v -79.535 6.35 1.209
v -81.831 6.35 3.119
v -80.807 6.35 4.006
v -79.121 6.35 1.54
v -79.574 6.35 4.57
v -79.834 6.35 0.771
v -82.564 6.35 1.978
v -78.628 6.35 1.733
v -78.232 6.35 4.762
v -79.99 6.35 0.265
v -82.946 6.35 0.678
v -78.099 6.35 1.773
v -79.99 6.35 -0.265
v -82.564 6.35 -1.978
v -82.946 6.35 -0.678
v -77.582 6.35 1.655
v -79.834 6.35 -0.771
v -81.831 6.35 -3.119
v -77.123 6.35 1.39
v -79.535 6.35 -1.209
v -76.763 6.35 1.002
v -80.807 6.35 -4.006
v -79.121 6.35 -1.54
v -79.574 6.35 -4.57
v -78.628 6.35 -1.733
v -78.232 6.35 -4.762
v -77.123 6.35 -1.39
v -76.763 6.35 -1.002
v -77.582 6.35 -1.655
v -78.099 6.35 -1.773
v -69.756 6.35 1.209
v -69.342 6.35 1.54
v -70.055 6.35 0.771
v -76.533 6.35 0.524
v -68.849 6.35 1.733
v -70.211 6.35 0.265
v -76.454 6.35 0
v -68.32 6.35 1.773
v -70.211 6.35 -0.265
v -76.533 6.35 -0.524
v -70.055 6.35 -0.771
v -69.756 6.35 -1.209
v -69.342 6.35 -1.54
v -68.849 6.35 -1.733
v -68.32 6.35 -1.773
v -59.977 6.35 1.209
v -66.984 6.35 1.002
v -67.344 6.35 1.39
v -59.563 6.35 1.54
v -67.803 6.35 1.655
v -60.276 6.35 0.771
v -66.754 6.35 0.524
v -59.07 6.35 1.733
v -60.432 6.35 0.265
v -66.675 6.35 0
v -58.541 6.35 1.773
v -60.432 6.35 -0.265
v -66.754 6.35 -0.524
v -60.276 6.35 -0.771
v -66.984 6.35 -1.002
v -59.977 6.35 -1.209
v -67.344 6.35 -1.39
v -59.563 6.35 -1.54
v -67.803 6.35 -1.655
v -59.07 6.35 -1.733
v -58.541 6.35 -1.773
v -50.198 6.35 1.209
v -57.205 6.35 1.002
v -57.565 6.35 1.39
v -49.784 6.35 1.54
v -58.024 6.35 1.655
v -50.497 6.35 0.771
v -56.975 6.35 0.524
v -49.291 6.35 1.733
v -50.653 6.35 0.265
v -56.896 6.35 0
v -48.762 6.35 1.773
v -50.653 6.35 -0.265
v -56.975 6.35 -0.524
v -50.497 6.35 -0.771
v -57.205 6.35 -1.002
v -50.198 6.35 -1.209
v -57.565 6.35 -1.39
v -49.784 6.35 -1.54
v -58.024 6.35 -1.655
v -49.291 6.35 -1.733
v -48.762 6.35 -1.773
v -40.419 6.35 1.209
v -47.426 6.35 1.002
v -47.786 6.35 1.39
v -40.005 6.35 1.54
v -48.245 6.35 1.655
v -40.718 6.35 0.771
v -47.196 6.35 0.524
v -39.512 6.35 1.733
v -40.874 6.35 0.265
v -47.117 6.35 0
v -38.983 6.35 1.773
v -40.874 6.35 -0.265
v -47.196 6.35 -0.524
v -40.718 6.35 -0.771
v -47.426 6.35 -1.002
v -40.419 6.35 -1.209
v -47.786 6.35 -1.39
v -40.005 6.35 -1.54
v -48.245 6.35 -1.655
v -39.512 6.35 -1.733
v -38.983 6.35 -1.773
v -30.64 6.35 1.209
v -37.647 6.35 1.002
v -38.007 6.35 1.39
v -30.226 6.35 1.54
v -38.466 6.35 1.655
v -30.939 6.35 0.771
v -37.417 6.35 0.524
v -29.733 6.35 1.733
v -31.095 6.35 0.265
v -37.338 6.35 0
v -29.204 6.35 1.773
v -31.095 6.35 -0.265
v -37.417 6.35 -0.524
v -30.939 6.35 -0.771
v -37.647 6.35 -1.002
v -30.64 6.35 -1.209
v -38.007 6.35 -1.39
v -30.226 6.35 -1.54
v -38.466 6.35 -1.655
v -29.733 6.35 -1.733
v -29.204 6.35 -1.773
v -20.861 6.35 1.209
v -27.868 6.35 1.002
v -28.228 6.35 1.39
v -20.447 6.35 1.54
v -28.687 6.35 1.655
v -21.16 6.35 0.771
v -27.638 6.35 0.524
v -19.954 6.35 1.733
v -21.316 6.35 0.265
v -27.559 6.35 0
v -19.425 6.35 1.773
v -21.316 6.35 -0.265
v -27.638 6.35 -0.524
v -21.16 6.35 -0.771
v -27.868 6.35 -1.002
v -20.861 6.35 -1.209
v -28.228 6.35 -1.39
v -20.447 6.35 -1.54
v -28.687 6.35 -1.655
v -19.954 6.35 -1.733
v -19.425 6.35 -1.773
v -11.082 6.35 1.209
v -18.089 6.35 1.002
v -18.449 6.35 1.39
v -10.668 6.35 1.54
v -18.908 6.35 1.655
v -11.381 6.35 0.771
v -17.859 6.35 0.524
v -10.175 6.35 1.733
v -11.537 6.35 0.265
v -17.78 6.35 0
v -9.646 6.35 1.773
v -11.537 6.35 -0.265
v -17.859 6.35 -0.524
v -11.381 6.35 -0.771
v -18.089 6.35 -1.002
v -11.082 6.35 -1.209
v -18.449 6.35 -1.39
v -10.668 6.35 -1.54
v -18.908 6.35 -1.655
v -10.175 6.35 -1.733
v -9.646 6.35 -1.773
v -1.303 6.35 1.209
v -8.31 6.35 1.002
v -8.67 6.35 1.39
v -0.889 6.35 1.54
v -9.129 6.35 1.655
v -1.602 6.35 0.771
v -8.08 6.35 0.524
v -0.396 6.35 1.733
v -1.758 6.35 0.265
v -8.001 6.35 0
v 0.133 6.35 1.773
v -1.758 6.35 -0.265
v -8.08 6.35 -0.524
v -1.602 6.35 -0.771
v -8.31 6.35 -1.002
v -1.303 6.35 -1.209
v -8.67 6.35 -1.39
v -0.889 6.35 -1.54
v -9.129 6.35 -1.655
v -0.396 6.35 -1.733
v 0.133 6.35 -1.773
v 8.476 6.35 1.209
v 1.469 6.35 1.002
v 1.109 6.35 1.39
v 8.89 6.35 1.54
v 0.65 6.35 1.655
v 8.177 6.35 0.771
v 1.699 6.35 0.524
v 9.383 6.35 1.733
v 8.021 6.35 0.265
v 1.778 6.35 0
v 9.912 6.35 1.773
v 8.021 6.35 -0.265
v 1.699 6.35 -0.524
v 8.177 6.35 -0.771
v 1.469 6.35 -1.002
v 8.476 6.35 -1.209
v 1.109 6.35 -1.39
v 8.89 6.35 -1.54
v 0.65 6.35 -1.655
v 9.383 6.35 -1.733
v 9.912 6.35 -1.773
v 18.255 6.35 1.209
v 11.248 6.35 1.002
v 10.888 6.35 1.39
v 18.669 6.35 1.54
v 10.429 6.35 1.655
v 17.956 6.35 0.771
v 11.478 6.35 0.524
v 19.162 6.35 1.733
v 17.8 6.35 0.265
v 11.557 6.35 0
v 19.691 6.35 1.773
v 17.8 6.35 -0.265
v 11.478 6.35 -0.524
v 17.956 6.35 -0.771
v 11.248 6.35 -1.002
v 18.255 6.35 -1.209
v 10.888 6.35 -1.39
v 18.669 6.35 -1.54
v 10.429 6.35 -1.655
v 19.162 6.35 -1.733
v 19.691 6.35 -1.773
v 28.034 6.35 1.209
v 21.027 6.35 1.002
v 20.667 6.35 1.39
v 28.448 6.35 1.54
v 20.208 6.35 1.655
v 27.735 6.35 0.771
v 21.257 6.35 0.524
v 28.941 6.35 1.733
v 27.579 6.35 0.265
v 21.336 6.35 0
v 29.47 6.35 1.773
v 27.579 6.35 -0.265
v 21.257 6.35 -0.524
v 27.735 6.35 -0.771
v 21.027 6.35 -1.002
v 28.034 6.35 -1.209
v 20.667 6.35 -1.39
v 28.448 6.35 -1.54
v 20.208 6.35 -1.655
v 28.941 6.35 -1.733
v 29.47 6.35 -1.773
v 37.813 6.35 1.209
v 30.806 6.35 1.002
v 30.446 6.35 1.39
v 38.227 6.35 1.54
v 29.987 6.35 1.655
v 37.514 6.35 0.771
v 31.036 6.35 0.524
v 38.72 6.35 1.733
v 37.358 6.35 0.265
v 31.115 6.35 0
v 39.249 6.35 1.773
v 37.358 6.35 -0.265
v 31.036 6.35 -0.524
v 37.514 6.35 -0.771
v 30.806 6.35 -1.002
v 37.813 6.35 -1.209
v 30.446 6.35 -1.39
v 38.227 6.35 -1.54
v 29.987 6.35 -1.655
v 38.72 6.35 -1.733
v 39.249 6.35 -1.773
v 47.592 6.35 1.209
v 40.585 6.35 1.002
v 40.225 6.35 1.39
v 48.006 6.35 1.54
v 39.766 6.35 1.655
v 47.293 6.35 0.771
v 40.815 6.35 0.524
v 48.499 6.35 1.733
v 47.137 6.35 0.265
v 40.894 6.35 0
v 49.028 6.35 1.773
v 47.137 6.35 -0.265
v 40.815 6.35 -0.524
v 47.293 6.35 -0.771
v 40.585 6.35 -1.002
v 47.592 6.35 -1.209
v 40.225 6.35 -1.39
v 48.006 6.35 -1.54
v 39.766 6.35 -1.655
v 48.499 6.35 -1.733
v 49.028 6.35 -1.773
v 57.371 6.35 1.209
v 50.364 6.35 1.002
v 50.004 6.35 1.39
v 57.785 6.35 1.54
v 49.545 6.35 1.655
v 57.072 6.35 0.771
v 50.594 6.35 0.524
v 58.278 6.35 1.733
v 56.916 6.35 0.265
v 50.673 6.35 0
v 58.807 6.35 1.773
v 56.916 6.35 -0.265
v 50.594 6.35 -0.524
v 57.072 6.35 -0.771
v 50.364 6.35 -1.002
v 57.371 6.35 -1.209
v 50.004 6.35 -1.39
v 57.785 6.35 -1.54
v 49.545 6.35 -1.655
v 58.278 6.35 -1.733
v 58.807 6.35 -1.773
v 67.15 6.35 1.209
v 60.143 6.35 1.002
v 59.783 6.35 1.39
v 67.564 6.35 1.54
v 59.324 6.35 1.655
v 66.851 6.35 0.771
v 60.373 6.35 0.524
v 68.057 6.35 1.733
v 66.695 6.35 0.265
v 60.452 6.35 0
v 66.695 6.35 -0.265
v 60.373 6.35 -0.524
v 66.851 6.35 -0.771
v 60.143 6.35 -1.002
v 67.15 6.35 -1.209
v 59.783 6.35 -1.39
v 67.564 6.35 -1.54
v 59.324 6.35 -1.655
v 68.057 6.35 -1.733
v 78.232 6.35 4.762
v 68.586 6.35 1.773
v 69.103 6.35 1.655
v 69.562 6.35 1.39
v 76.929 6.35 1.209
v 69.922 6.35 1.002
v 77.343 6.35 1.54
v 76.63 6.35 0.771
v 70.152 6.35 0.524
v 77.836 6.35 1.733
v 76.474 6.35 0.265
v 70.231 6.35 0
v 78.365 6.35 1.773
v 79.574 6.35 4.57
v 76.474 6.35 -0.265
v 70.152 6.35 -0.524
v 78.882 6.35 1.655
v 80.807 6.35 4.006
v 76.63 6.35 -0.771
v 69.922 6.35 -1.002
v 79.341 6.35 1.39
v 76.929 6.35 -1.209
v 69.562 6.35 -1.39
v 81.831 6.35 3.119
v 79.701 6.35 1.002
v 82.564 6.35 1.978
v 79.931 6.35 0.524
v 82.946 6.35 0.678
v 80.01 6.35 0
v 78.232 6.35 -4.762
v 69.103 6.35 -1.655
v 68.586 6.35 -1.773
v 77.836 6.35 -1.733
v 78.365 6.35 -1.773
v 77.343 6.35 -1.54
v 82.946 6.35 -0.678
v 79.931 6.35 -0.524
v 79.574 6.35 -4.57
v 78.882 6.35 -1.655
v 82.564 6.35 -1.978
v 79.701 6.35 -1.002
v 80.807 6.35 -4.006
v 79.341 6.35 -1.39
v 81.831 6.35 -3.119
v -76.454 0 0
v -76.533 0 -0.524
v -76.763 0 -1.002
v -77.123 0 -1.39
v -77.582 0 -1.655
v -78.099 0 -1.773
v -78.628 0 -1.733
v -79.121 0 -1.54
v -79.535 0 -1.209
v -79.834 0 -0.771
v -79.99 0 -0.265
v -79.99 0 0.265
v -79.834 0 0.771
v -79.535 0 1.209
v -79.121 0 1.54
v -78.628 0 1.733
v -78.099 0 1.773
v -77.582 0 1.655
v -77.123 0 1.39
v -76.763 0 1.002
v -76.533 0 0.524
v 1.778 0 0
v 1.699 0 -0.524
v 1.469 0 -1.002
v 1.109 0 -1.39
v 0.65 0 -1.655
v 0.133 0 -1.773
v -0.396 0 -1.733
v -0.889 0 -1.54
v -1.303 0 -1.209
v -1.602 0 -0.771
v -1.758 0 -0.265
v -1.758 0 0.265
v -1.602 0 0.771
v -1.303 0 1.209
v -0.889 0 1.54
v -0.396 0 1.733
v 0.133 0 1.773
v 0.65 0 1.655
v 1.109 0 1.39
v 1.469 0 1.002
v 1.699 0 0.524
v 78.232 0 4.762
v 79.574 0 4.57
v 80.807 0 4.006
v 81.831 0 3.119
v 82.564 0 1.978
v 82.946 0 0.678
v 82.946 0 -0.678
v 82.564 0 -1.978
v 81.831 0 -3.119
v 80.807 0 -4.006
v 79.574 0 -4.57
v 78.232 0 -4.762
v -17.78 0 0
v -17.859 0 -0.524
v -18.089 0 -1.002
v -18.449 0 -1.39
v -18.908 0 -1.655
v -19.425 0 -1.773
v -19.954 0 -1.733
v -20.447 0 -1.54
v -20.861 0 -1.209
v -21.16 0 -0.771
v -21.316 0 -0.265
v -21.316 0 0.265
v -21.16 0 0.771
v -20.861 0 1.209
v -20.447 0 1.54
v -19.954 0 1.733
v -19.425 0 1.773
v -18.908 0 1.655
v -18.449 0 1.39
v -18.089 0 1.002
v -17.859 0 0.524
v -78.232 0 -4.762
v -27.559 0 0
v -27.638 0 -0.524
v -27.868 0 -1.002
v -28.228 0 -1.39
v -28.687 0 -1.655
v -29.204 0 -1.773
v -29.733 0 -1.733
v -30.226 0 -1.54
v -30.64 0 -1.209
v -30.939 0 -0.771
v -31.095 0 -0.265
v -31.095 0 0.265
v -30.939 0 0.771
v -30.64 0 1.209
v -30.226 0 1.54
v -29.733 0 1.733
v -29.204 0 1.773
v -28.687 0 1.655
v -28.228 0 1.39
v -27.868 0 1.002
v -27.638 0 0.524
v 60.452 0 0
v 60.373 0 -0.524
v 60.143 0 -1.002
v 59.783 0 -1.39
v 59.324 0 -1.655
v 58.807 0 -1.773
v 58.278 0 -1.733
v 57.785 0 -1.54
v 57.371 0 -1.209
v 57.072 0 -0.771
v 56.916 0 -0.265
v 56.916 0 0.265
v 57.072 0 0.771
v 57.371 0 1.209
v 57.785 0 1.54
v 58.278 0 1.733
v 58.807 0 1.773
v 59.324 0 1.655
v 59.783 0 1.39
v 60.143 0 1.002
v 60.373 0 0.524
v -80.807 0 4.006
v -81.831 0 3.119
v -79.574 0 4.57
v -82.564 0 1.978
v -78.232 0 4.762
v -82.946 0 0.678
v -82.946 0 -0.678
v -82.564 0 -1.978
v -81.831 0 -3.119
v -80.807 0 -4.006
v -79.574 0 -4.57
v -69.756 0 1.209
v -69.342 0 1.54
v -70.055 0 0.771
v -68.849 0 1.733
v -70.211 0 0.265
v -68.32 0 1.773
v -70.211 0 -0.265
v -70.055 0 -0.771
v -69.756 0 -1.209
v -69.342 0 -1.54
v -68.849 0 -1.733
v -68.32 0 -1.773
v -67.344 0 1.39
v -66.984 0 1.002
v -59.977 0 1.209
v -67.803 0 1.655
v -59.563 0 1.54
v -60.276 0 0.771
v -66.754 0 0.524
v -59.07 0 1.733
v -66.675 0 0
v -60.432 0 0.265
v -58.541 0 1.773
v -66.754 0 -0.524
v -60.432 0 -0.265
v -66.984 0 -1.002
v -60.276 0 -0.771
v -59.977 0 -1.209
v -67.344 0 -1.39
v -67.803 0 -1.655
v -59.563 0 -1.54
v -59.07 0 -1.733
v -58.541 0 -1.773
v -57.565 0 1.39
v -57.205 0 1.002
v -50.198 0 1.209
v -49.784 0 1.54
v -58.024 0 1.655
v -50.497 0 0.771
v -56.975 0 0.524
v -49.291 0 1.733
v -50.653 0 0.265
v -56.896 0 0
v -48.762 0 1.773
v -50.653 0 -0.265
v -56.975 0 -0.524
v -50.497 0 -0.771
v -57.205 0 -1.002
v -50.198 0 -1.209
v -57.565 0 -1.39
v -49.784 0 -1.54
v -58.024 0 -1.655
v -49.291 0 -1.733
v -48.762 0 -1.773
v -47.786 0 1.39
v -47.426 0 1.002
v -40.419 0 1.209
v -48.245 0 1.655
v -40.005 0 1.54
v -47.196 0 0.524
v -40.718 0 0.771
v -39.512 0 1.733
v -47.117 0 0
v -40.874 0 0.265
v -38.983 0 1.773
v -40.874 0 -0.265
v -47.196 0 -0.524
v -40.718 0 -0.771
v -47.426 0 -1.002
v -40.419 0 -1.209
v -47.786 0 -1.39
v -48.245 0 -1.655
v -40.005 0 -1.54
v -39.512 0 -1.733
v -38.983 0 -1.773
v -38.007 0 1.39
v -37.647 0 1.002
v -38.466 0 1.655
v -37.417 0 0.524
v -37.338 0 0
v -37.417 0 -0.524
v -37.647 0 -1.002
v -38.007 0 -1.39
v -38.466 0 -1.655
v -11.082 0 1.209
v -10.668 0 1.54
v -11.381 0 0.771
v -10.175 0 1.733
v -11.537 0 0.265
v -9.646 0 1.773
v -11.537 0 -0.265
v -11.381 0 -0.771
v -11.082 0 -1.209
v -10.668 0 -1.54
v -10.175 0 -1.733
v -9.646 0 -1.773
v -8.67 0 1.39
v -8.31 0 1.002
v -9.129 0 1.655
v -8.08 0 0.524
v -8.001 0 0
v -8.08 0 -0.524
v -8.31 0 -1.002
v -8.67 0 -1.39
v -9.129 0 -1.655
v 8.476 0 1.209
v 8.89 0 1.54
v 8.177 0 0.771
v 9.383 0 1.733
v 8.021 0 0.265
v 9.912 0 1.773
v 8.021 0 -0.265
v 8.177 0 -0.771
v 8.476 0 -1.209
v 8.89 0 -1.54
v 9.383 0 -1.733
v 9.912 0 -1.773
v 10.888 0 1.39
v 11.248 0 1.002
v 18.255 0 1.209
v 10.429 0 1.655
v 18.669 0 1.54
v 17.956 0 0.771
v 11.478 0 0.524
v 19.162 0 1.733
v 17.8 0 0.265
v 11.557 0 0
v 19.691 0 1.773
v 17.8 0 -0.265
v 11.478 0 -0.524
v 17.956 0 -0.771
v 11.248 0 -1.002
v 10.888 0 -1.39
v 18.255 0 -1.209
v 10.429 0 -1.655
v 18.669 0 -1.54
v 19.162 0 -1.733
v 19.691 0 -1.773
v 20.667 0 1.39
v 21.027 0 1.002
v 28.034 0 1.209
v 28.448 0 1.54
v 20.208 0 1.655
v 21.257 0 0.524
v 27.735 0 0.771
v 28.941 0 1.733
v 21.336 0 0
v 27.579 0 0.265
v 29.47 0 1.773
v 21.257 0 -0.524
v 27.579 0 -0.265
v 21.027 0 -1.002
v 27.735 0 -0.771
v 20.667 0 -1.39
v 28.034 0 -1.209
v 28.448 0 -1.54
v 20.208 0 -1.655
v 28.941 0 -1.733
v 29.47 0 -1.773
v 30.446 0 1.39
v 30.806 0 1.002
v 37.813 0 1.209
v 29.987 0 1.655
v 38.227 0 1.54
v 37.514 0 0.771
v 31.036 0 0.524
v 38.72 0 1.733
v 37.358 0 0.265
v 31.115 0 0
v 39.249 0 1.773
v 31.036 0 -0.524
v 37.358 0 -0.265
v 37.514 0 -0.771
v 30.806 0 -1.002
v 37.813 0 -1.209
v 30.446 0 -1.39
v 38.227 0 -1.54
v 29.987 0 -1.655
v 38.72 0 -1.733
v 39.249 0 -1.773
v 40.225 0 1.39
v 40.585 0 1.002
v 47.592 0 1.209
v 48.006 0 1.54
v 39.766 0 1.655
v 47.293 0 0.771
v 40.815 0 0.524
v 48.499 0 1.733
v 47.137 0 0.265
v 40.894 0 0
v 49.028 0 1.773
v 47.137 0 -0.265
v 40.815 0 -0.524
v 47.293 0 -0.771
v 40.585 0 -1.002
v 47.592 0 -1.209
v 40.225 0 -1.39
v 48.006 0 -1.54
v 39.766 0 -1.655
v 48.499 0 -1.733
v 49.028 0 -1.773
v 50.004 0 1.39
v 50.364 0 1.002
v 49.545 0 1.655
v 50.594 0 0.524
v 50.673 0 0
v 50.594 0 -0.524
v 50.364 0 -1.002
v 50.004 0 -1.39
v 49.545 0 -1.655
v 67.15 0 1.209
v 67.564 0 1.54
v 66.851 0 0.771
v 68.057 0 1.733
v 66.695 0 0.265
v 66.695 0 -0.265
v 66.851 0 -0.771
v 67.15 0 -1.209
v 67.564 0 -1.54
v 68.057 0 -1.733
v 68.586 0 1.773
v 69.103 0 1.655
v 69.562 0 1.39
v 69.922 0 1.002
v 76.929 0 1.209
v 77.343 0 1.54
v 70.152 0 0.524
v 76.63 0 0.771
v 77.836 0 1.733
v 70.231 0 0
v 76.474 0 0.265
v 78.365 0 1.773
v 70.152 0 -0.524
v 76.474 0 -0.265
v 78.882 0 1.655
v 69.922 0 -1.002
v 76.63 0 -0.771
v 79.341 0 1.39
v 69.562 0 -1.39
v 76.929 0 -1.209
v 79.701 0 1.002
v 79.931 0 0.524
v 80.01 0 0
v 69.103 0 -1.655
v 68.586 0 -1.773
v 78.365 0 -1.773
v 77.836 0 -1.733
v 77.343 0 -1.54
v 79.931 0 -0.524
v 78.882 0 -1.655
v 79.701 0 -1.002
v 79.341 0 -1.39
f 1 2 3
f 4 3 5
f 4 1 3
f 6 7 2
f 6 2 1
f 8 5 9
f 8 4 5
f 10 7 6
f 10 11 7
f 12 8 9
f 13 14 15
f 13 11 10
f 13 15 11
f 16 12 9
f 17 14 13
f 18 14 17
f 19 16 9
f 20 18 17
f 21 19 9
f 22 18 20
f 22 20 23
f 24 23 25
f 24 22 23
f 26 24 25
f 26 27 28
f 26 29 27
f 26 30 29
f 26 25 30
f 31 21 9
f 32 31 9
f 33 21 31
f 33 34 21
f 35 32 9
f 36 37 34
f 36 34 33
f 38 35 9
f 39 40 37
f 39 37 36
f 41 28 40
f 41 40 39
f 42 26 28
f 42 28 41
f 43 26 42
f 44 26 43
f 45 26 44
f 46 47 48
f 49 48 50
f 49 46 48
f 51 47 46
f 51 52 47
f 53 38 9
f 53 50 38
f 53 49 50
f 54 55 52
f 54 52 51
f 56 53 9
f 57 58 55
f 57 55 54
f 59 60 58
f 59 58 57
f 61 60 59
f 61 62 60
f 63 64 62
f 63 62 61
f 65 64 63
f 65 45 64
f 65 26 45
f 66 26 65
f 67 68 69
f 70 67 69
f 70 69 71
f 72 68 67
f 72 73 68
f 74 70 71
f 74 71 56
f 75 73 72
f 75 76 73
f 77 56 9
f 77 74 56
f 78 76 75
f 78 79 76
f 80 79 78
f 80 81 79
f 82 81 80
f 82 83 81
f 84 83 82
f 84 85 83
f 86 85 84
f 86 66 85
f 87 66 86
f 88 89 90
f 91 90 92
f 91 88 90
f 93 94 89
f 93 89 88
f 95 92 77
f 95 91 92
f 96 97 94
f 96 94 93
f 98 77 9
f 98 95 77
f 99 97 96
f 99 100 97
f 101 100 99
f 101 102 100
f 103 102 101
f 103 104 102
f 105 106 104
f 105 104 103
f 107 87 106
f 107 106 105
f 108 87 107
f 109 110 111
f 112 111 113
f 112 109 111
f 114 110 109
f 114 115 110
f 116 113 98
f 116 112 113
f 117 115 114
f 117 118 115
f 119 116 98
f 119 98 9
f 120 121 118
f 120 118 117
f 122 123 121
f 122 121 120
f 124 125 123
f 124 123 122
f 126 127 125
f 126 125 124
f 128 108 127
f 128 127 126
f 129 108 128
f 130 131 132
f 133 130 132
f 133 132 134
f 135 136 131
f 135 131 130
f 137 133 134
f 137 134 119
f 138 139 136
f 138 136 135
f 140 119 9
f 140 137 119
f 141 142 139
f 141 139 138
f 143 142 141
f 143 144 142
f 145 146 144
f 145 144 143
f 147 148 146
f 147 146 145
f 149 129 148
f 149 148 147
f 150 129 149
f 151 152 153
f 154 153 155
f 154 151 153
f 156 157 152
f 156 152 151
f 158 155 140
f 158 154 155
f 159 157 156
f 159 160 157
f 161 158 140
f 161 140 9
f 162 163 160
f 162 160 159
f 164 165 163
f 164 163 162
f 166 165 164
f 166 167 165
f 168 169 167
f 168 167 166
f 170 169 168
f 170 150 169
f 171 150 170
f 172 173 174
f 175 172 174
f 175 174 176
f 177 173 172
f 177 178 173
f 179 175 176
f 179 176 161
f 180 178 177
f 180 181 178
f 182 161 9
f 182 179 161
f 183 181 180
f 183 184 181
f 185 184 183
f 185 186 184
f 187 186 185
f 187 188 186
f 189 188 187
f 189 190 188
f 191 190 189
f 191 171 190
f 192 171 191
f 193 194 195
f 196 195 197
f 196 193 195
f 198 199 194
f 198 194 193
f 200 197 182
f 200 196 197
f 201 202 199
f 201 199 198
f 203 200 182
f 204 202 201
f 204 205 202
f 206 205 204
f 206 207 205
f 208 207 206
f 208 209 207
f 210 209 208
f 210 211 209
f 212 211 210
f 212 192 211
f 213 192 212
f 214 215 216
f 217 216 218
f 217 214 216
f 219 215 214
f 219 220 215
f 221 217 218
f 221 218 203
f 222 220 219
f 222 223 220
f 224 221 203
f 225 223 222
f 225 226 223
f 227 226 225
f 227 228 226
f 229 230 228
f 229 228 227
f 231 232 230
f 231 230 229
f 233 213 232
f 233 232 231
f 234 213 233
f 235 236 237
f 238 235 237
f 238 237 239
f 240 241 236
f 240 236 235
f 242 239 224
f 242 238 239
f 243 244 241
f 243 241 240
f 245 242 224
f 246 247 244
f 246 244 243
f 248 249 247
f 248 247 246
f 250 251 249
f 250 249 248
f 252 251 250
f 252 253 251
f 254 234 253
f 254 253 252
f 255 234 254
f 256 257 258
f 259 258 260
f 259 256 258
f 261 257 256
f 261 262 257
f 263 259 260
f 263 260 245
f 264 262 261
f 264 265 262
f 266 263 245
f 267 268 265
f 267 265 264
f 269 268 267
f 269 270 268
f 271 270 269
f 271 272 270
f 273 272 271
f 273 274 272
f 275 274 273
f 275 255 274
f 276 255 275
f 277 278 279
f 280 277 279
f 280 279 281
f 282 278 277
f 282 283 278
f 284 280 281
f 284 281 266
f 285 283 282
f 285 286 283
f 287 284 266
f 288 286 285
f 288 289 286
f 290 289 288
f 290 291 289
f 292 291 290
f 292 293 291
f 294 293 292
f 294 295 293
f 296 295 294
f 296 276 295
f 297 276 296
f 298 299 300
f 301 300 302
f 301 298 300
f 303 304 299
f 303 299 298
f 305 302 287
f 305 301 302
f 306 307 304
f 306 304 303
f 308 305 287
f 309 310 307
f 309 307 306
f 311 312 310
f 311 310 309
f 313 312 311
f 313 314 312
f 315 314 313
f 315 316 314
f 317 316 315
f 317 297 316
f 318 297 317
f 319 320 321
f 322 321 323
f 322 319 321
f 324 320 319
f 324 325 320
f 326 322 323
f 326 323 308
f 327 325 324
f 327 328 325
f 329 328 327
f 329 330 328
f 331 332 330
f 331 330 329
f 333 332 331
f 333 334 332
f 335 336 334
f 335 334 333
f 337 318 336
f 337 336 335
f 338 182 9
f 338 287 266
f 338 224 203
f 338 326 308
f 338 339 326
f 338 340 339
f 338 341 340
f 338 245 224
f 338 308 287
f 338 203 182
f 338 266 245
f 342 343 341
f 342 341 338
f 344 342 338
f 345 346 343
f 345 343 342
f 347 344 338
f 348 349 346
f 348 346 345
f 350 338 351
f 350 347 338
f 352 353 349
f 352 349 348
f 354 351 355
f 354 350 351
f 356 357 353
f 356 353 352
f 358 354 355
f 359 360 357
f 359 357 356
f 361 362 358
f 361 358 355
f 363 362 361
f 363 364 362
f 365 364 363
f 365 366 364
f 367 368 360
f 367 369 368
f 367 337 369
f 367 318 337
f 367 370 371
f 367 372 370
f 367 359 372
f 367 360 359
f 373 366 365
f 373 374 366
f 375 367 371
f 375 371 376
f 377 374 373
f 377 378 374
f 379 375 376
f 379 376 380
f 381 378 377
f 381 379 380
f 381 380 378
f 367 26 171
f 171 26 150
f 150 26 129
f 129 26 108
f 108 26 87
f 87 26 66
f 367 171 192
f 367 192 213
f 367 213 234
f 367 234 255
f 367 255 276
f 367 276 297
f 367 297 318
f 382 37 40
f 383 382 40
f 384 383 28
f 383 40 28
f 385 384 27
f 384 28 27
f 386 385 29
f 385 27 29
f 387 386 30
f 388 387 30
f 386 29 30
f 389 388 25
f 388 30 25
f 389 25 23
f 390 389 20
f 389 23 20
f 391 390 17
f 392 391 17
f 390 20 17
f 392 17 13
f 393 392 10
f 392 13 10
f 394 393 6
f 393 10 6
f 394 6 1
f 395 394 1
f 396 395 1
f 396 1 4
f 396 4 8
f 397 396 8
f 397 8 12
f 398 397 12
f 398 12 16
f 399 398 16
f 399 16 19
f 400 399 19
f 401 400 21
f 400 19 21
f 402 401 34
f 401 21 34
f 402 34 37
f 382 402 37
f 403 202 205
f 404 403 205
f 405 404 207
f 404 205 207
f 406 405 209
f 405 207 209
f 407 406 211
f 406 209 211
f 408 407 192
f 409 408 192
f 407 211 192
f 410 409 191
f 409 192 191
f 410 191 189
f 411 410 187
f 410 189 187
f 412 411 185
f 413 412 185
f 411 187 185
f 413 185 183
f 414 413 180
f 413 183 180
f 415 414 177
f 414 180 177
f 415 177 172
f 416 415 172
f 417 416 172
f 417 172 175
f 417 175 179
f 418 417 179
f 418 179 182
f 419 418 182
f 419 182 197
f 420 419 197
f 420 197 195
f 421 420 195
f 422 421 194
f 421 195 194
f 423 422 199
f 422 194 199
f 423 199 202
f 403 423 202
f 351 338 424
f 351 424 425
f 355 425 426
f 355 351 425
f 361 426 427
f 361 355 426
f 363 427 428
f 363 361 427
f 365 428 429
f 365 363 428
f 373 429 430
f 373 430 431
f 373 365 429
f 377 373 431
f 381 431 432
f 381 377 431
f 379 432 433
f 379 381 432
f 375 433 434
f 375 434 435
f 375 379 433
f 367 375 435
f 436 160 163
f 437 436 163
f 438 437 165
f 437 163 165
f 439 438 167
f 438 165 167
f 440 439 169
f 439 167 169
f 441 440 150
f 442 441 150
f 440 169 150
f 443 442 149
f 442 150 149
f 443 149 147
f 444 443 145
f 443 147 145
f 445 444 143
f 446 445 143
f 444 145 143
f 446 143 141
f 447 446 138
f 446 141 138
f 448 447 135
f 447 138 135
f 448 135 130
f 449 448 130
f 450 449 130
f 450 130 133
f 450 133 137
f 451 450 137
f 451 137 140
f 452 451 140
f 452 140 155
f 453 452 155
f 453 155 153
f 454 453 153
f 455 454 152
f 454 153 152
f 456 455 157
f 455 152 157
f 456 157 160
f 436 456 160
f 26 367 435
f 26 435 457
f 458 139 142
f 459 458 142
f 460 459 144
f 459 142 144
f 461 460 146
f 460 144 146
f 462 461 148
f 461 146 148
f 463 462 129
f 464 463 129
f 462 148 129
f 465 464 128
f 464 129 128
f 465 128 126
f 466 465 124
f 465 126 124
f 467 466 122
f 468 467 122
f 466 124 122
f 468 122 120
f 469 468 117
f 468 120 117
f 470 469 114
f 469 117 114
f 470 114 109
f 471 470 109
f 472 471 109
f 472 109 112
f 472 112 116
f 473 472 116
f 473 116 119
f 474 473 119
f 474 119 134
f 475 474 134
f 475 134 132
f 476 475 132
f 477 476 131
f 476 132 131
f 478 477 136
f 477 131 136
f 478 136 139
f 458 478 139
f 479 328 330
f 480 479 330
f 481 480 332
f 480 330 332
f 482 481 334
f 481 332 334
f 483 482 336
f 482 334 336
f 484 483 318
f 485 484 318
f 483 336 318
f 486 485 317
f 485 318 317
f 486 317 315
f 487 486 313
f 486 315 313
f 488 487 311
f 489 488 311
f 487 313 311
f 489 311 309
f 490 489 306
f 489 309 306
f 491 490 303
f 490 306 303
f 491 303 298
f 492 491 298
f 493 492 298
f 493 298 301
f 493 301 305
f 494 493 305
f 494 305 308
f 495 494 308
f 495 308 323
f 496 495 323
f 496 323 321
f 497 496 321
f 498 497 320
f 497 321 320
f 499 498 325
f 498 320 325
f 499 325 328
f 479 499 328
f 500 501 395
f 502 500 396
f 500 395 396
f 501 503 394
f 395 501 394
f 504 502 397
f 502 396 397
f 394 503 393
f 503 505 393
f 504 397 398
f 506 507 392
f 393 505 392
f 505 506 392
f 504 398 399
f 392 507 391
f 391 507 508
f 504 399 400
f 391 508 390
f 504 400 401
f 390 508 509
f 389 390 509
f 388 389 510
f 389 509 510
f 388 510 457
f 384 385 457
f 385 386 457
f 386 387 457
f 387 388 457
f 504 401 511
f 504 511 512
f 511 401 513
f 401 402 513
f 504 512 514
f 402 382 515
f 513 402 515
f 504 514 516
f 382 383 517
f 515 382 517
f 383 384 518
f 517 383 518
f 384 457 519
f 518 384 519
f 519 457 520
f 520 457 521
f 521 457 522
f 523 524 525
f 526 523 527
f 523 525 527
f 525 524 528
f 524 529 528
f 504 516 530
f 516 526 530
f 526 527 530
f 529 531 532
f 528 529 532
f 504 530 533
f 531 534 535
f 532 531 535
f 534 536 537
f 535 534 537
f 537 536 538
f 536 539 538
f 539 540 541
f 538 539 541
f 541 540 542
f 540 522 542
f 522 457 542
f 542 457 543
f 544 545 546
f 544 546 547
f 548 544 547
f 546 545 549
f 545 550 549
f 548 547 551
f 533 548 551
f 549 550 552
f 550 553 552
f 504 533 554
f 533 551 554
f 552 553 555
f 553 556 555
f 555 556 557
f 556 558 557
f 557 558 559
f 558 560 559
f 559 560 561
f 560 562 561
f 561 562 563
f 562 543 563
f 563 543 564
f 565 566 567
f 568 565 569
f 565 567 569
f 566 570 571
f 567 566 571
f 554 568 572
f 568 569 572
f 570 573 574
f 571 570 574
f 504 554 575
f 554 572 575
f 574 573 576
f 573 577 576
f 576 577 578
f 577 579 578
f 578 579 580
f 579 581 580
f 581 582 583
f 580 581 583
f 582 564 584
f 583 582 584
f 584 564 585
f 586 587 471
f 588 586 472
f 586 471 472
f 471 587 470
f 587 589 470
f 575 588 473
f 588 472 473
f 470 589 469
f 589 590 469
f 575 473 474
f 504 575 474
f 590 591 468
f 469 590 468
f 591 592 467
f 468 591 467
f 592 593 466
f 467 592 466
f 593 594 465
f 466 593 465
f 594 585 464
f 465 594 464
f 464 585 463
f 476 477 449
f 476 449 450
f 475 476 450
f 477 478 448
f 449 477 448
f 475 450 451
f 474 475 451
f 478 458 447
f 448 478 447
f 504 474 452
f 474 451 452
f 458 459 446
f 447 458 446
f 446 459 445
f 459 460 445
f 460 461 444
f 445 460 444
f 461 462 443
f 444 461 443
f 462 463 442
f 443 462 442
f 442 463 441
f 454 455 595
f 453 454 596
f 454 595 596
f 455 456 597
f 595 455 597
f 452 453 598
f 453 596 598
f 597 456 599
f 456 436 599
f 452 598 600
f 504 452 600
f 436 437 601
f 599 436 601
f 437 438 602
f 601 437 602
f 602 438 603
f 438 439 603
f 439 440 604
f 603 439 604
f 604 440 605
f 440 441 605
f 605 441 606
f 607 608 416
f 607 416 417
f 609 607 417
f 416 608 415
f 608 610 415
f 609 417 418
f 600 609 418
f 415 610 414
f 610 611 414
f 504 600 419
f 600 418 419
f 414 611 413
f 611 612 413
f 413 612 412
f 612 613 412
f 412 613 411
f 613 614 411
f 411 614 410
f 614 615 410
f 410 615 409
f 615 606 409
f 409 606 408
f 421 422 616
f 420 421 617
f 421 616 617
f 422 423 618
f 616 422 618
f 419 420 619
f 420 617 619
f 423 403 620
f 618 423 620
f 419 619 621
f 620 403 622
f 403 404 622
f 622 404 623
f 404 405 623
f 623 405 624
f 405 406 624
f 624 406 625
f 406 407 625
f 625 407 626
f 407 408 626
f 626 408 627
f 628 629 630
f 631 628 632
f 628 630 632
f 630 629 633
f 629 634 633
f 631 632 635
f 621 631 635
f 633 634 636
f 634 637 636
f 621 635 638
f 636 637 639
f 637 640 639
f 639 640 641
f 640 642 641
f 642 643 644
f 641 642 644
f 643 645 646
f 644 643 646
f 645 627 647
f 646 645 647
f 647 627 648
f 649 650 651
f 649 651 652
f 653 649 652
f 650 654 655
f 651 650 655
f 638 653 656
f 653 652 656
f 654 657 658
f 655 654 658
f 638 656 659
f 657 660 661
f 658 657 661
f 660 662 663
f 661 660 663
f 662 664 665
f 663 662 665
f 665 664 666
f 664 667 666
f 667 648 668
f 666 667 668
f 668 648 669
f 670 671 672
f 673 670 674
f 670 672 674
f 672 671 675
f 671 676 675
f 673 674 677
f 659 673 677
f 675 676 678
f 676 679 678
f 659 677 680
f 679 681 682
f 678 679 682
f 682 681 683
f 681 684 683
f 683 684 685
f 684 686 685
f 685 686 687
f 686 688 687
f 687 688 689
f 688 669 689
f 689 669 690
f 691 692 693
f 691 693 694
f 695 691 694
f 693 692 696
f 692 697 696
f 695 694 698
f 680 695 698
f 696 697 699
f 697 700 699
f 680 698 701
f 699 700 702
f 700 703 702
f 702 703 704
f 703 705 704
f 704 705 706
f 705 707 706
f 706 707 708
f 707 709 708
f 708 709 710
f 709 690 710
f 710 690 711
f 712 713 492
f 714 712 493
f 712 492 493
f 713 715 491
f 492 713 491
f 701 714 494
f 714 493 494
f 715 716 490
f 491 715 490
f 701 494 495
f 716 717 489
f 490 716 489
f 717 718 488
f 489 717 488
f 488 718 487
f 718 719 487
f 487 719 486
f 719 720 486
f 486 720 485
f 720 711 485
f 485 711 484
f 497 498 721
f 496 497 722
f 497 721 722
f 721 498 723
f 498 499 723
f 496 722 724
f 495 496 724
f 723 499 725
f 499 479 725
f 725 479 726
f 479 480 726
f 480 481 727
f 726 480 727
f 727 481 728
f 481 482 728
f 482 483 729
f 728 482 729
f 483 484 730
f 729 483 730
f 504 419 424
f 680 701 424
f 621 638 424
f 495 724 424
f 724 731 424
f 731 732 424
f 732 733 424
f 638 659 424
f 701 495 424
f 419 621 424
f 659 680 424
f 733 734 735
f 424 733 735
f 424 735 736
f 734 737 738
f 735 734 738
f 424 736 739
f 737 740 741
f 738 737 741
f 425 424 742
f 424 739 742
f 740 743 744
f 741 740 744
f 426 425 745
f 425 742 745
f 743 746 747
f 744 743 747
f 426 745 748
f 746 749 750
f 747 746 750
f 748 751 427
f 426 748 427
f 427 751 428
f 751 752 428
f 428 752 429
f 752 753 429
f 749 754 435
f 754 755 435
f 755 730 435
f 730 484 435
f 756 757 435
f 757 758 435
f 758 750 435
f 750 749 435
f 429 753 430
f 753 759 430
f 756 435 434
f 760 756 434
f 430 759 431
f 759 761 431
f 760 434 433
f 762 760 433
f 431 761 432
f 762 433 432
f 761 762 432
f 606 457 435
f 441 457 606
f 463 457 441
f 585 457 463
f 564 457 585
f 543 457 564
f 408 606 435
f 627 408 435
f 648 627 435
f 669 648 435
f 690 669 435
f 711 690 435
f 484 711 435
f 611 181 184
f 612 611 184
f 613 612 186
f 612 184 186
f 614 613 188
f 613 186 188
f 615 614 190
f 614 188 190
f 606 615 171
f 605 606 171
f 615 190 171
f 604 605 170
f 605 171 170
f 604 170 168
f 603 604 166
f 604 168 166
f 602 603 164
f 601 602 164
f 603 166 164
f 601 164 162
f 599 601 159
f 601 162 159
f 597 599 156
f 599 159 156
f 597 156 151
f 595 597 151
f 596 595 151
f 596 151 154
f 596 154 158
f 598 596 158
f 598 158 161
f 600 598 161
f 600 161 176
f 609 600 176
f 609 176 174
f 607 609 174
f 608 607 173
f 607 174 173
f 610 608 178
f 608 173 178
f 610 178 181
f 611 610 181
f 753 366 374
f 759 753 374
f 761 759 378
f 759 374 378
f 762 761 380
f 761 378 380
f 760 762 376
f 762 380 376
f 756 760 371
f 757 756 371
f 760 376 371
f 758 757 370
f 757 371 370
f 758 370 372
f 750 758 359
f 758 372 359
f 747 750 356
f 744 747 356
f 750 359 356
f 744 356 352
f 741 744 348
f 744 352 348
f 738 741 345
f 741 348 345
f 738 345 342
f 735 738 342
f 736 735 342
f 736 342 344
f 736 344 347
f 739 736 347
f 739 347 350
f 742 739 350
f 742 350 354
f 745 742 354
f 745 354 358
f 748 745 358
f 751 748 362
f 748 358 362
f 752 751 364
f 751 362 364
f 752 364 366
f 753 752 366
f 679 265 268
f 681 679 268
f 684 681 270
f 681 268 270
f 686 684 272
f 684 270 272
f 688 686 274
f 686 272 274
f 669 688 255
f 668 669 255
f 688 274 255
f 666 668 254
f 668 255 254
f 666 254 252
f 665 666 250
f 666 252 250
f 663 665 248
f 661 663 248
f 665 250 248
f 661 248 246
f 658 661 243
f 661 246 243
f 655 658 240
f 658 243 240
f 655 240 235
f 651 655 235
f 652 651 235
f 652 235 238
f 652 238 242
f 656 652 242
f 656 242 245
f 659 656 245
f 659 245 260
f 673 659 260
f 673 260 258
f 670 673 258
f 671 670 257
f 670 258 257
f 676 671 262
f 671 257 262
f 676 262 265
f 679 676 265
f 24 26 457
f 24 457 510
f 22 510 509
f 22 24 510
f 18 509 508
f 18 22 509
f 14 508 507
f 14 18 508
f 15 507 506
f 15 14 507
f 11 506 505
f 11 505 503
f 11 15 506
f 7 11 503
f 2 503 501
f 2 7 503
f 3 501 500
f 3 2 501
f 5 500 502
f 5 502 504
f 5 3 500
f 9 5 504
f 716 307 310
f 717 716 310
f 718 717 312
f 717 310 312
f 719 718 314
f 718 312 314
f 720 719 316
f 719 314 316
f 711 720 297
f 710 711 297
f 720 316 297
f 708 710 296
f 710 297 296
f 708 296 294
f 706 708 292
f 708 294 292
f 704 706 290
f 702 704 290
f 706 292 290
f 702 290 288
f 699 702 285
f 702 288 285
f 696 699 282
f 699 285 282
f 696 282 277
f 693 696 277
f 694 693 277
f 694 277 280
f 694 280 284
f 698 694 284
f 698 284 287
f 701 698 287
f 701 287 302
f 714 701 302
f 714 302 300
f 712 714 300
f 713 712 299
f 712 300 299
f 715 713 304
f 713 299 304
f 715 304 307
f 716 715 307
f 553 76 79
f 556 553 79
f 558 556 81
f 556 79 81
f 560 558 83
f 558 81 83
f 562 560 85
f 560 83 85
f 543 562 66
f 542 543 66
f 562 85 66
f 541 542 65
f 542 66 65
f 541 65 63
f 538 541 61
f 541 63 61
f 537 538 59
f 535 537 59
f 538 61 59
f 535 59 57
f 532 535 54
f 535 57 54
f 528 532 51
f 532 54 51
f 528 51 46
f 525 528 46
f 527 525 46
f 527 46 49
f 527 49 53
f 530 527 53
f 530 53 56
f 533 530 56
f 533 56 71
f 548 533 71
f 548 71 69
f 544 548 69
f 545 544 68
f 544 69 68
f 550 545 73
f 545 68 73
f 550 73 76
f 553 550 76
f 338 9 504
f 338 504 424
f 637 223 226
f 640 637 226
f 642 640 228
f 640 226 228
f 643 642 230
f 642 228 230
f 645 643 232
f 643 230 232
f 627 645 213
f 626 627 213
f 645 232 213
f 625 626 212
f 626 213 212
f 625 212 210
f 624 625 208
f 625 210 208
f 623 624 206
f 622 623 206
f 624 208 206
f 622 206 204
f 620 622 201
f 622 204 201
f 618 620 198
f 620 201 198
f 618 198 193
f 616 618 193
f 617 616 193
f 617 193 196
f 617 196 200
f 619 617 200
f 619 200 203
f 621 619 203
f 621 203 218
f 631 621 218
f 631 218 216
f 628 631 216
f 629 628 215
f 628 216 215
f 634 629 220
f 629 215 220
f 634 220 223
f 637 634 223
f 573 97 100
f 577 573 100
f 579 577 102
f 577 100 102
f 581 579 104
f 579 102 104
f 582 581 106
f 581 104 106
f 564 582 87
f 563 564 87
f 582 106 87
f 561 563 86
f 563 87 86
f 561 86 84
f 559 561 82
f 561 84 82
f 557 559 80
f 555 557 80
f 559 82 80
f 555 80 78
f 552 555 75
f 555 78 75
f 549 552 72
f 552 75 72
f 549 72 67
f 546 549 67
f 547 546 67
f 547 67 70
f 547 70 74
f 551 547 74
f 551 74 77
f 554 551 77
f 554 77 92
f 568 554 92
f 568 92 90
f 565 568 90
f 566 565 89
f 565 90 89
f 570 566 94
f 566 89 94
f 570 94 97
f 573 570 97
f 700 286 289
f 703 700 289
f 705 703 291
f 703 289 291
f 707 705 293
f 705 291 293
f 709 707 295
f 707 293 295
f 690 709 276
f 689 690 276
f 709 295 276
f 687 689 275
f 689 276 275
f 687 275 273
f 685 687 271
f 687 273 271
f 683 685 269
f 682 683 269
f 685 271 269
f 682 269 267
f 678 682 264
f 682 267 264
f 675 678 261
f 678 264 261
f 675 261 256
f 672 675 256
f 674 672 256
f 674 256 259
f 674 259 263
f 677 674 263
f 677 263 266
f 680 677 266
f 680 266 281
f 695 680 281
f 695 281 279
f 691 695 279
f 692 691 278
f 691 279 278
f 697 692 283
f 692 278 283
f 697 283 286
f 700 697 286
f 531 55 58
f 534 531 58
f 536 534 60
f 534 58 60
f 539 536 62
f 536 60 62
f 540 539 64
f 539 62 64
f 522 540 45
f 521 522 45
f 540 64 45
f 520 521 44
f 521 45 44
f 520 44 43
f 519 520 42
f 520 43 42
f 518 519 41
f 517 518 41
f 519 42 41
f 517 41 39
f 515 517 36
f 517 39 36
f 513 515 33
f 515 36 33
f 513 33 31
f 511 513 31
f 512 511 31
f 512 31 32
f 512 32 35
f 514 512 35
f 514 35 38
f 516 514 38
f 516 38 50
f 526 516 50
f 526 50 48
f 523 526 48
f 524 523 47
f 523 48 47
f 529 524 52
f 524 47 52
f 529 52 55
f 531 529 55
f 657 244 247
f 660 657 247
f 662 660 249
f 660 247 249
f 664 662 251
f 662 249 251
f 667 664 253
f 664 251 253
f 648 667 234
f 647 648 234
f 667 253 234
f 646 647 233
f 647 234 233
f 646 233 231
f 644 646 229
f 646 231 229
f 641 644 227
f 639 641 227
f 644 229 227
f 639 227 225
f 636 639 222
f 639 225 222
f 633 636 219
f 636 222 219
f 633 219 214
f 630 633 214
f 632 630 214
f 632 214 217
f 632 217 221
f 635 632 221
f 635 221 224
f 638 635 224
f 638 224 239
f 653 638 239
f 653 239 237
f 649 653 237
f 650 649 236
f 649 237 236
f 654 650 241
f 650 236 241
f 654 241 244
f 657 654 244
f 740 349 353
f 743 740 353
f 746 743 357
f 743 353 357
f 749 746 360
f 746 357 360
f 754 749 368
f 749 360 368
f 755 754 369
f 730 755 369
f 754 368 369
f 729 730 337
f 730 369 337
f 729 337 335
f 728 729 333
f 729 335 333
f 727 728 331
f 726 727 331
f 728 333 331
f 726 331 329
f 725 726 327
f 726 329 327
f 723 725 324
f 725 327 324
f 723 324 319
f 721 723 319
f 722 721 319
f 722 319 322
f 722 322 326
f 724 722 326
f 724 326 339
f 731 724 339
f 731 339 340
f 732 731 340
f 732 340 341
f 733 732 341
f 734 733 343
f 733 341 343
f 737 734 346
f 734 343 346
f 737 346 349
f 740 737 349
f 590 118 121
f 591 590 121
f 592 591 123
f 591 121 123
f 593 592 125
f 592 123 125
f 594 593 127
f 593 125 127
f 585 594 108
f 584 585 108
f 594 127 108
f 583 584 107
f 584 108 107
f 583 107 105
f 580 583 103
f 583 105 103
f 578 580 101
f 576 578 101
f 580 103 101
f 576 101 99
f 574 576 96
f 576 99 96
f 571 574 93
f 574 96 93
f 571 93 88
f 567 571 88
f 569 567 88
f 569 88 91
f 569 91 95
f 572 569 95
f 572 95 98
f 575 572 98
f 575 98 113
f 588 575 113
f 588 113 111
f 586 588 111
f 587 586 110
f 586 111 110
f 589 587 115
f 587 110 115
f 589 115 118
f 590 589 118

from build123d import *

# Parameters (mm, degrees)
SKETCH1_R           = 1.778
BOSS_EXTRUDE1_DEPTH = 6.35


with BuildPart() as part:
    # Sketch1 → Boss-Extrude1 (new body)
    with BuildSketch(Plane(origin=(0, 6.35, 0), x_dir=(1, 0, 0), z_dir=(0, 1, 0))):
        with BuildLine():
            Line((78.232, 4.7625), (-78.232, 4.7625))
            ThreePointArc((-78.232, 4.7625), (-82.9945, 0), (-78.232, -4.7625))
            Line((-78.232, -4.7625), (78.232, -4.7625))
            ThreePointArc((78.232, -4.7625), (82.9945, 0), (78.232, 4.7625))
        make_face()
        with Locations((78.232, 0)):
            Circle(SKETCH1_R, mode=Mode.SUBTRACT)
        with Locations((68.453, 0)):
            Circle(SKETCH1_R, mode=Mode.SUBTRACT)
        with Locations((58.674, 0)):
            Circle(SKETCH1_R, mode=Mode.SUBTRACT)
        with Locations((48.895, 0)):
            Circle(SKETCH1_R, mode=Mode.SUBTRACT)
        with Locations((39.116, 0)):
            Circle(SKETCH1_R, mode=Mode.SUBTRACT)
        with Locations((29.337, 0)):
            Circle(SKETCH1_R, mode=Mode.SUBTRACT)
        with Locations((19.558, 0)):
            Circle(SKETCH1_R, mode=Mode.SUBTRACT)
        with Locations((9.779, 0)):
            Circle(SKETCH1_R, mode=Mode.SUBTRACT)
        Circle(SKETCH1_R, mode=Mode.SUBTRACT)
        with Locations((-9.779, 0)):
            Circle(SKETCH1_R, mode=Mode.SUBTRACT)
        with Locations((-19.558, 0)):
            Circle(SKETCH1_R, mode=Mode.SUBTRACT)
        with Locations((-29.337, 0)):
            Circle(SKETCH1_R, mode=Mode.SUBTRACT)
        with Locations((-39.116, 0)):
            Circle(SKETCH1_R, mode=Mode.SUBTRACT)
        with Locations((-48.895, 0)):
            Circle(SKETCH1_R, mode=Mode.SUBTRACT)
        with Locations((-58.674, 0)):
            Circle(SKETCH1_R, mode=Mode.SUBTRACT)
        with Locations((-68.453, 0)):
            Circle(SKETCH1_R, mode=Mode.SUBTRACT)
        with Locations((-78.232, 0)):
            Circle(SKETCH1_R, mode=Mode.SUBTRACT)
    extrude(amount=-BOSS_EXTRUDE1_DEPTH)


solid = part.part
